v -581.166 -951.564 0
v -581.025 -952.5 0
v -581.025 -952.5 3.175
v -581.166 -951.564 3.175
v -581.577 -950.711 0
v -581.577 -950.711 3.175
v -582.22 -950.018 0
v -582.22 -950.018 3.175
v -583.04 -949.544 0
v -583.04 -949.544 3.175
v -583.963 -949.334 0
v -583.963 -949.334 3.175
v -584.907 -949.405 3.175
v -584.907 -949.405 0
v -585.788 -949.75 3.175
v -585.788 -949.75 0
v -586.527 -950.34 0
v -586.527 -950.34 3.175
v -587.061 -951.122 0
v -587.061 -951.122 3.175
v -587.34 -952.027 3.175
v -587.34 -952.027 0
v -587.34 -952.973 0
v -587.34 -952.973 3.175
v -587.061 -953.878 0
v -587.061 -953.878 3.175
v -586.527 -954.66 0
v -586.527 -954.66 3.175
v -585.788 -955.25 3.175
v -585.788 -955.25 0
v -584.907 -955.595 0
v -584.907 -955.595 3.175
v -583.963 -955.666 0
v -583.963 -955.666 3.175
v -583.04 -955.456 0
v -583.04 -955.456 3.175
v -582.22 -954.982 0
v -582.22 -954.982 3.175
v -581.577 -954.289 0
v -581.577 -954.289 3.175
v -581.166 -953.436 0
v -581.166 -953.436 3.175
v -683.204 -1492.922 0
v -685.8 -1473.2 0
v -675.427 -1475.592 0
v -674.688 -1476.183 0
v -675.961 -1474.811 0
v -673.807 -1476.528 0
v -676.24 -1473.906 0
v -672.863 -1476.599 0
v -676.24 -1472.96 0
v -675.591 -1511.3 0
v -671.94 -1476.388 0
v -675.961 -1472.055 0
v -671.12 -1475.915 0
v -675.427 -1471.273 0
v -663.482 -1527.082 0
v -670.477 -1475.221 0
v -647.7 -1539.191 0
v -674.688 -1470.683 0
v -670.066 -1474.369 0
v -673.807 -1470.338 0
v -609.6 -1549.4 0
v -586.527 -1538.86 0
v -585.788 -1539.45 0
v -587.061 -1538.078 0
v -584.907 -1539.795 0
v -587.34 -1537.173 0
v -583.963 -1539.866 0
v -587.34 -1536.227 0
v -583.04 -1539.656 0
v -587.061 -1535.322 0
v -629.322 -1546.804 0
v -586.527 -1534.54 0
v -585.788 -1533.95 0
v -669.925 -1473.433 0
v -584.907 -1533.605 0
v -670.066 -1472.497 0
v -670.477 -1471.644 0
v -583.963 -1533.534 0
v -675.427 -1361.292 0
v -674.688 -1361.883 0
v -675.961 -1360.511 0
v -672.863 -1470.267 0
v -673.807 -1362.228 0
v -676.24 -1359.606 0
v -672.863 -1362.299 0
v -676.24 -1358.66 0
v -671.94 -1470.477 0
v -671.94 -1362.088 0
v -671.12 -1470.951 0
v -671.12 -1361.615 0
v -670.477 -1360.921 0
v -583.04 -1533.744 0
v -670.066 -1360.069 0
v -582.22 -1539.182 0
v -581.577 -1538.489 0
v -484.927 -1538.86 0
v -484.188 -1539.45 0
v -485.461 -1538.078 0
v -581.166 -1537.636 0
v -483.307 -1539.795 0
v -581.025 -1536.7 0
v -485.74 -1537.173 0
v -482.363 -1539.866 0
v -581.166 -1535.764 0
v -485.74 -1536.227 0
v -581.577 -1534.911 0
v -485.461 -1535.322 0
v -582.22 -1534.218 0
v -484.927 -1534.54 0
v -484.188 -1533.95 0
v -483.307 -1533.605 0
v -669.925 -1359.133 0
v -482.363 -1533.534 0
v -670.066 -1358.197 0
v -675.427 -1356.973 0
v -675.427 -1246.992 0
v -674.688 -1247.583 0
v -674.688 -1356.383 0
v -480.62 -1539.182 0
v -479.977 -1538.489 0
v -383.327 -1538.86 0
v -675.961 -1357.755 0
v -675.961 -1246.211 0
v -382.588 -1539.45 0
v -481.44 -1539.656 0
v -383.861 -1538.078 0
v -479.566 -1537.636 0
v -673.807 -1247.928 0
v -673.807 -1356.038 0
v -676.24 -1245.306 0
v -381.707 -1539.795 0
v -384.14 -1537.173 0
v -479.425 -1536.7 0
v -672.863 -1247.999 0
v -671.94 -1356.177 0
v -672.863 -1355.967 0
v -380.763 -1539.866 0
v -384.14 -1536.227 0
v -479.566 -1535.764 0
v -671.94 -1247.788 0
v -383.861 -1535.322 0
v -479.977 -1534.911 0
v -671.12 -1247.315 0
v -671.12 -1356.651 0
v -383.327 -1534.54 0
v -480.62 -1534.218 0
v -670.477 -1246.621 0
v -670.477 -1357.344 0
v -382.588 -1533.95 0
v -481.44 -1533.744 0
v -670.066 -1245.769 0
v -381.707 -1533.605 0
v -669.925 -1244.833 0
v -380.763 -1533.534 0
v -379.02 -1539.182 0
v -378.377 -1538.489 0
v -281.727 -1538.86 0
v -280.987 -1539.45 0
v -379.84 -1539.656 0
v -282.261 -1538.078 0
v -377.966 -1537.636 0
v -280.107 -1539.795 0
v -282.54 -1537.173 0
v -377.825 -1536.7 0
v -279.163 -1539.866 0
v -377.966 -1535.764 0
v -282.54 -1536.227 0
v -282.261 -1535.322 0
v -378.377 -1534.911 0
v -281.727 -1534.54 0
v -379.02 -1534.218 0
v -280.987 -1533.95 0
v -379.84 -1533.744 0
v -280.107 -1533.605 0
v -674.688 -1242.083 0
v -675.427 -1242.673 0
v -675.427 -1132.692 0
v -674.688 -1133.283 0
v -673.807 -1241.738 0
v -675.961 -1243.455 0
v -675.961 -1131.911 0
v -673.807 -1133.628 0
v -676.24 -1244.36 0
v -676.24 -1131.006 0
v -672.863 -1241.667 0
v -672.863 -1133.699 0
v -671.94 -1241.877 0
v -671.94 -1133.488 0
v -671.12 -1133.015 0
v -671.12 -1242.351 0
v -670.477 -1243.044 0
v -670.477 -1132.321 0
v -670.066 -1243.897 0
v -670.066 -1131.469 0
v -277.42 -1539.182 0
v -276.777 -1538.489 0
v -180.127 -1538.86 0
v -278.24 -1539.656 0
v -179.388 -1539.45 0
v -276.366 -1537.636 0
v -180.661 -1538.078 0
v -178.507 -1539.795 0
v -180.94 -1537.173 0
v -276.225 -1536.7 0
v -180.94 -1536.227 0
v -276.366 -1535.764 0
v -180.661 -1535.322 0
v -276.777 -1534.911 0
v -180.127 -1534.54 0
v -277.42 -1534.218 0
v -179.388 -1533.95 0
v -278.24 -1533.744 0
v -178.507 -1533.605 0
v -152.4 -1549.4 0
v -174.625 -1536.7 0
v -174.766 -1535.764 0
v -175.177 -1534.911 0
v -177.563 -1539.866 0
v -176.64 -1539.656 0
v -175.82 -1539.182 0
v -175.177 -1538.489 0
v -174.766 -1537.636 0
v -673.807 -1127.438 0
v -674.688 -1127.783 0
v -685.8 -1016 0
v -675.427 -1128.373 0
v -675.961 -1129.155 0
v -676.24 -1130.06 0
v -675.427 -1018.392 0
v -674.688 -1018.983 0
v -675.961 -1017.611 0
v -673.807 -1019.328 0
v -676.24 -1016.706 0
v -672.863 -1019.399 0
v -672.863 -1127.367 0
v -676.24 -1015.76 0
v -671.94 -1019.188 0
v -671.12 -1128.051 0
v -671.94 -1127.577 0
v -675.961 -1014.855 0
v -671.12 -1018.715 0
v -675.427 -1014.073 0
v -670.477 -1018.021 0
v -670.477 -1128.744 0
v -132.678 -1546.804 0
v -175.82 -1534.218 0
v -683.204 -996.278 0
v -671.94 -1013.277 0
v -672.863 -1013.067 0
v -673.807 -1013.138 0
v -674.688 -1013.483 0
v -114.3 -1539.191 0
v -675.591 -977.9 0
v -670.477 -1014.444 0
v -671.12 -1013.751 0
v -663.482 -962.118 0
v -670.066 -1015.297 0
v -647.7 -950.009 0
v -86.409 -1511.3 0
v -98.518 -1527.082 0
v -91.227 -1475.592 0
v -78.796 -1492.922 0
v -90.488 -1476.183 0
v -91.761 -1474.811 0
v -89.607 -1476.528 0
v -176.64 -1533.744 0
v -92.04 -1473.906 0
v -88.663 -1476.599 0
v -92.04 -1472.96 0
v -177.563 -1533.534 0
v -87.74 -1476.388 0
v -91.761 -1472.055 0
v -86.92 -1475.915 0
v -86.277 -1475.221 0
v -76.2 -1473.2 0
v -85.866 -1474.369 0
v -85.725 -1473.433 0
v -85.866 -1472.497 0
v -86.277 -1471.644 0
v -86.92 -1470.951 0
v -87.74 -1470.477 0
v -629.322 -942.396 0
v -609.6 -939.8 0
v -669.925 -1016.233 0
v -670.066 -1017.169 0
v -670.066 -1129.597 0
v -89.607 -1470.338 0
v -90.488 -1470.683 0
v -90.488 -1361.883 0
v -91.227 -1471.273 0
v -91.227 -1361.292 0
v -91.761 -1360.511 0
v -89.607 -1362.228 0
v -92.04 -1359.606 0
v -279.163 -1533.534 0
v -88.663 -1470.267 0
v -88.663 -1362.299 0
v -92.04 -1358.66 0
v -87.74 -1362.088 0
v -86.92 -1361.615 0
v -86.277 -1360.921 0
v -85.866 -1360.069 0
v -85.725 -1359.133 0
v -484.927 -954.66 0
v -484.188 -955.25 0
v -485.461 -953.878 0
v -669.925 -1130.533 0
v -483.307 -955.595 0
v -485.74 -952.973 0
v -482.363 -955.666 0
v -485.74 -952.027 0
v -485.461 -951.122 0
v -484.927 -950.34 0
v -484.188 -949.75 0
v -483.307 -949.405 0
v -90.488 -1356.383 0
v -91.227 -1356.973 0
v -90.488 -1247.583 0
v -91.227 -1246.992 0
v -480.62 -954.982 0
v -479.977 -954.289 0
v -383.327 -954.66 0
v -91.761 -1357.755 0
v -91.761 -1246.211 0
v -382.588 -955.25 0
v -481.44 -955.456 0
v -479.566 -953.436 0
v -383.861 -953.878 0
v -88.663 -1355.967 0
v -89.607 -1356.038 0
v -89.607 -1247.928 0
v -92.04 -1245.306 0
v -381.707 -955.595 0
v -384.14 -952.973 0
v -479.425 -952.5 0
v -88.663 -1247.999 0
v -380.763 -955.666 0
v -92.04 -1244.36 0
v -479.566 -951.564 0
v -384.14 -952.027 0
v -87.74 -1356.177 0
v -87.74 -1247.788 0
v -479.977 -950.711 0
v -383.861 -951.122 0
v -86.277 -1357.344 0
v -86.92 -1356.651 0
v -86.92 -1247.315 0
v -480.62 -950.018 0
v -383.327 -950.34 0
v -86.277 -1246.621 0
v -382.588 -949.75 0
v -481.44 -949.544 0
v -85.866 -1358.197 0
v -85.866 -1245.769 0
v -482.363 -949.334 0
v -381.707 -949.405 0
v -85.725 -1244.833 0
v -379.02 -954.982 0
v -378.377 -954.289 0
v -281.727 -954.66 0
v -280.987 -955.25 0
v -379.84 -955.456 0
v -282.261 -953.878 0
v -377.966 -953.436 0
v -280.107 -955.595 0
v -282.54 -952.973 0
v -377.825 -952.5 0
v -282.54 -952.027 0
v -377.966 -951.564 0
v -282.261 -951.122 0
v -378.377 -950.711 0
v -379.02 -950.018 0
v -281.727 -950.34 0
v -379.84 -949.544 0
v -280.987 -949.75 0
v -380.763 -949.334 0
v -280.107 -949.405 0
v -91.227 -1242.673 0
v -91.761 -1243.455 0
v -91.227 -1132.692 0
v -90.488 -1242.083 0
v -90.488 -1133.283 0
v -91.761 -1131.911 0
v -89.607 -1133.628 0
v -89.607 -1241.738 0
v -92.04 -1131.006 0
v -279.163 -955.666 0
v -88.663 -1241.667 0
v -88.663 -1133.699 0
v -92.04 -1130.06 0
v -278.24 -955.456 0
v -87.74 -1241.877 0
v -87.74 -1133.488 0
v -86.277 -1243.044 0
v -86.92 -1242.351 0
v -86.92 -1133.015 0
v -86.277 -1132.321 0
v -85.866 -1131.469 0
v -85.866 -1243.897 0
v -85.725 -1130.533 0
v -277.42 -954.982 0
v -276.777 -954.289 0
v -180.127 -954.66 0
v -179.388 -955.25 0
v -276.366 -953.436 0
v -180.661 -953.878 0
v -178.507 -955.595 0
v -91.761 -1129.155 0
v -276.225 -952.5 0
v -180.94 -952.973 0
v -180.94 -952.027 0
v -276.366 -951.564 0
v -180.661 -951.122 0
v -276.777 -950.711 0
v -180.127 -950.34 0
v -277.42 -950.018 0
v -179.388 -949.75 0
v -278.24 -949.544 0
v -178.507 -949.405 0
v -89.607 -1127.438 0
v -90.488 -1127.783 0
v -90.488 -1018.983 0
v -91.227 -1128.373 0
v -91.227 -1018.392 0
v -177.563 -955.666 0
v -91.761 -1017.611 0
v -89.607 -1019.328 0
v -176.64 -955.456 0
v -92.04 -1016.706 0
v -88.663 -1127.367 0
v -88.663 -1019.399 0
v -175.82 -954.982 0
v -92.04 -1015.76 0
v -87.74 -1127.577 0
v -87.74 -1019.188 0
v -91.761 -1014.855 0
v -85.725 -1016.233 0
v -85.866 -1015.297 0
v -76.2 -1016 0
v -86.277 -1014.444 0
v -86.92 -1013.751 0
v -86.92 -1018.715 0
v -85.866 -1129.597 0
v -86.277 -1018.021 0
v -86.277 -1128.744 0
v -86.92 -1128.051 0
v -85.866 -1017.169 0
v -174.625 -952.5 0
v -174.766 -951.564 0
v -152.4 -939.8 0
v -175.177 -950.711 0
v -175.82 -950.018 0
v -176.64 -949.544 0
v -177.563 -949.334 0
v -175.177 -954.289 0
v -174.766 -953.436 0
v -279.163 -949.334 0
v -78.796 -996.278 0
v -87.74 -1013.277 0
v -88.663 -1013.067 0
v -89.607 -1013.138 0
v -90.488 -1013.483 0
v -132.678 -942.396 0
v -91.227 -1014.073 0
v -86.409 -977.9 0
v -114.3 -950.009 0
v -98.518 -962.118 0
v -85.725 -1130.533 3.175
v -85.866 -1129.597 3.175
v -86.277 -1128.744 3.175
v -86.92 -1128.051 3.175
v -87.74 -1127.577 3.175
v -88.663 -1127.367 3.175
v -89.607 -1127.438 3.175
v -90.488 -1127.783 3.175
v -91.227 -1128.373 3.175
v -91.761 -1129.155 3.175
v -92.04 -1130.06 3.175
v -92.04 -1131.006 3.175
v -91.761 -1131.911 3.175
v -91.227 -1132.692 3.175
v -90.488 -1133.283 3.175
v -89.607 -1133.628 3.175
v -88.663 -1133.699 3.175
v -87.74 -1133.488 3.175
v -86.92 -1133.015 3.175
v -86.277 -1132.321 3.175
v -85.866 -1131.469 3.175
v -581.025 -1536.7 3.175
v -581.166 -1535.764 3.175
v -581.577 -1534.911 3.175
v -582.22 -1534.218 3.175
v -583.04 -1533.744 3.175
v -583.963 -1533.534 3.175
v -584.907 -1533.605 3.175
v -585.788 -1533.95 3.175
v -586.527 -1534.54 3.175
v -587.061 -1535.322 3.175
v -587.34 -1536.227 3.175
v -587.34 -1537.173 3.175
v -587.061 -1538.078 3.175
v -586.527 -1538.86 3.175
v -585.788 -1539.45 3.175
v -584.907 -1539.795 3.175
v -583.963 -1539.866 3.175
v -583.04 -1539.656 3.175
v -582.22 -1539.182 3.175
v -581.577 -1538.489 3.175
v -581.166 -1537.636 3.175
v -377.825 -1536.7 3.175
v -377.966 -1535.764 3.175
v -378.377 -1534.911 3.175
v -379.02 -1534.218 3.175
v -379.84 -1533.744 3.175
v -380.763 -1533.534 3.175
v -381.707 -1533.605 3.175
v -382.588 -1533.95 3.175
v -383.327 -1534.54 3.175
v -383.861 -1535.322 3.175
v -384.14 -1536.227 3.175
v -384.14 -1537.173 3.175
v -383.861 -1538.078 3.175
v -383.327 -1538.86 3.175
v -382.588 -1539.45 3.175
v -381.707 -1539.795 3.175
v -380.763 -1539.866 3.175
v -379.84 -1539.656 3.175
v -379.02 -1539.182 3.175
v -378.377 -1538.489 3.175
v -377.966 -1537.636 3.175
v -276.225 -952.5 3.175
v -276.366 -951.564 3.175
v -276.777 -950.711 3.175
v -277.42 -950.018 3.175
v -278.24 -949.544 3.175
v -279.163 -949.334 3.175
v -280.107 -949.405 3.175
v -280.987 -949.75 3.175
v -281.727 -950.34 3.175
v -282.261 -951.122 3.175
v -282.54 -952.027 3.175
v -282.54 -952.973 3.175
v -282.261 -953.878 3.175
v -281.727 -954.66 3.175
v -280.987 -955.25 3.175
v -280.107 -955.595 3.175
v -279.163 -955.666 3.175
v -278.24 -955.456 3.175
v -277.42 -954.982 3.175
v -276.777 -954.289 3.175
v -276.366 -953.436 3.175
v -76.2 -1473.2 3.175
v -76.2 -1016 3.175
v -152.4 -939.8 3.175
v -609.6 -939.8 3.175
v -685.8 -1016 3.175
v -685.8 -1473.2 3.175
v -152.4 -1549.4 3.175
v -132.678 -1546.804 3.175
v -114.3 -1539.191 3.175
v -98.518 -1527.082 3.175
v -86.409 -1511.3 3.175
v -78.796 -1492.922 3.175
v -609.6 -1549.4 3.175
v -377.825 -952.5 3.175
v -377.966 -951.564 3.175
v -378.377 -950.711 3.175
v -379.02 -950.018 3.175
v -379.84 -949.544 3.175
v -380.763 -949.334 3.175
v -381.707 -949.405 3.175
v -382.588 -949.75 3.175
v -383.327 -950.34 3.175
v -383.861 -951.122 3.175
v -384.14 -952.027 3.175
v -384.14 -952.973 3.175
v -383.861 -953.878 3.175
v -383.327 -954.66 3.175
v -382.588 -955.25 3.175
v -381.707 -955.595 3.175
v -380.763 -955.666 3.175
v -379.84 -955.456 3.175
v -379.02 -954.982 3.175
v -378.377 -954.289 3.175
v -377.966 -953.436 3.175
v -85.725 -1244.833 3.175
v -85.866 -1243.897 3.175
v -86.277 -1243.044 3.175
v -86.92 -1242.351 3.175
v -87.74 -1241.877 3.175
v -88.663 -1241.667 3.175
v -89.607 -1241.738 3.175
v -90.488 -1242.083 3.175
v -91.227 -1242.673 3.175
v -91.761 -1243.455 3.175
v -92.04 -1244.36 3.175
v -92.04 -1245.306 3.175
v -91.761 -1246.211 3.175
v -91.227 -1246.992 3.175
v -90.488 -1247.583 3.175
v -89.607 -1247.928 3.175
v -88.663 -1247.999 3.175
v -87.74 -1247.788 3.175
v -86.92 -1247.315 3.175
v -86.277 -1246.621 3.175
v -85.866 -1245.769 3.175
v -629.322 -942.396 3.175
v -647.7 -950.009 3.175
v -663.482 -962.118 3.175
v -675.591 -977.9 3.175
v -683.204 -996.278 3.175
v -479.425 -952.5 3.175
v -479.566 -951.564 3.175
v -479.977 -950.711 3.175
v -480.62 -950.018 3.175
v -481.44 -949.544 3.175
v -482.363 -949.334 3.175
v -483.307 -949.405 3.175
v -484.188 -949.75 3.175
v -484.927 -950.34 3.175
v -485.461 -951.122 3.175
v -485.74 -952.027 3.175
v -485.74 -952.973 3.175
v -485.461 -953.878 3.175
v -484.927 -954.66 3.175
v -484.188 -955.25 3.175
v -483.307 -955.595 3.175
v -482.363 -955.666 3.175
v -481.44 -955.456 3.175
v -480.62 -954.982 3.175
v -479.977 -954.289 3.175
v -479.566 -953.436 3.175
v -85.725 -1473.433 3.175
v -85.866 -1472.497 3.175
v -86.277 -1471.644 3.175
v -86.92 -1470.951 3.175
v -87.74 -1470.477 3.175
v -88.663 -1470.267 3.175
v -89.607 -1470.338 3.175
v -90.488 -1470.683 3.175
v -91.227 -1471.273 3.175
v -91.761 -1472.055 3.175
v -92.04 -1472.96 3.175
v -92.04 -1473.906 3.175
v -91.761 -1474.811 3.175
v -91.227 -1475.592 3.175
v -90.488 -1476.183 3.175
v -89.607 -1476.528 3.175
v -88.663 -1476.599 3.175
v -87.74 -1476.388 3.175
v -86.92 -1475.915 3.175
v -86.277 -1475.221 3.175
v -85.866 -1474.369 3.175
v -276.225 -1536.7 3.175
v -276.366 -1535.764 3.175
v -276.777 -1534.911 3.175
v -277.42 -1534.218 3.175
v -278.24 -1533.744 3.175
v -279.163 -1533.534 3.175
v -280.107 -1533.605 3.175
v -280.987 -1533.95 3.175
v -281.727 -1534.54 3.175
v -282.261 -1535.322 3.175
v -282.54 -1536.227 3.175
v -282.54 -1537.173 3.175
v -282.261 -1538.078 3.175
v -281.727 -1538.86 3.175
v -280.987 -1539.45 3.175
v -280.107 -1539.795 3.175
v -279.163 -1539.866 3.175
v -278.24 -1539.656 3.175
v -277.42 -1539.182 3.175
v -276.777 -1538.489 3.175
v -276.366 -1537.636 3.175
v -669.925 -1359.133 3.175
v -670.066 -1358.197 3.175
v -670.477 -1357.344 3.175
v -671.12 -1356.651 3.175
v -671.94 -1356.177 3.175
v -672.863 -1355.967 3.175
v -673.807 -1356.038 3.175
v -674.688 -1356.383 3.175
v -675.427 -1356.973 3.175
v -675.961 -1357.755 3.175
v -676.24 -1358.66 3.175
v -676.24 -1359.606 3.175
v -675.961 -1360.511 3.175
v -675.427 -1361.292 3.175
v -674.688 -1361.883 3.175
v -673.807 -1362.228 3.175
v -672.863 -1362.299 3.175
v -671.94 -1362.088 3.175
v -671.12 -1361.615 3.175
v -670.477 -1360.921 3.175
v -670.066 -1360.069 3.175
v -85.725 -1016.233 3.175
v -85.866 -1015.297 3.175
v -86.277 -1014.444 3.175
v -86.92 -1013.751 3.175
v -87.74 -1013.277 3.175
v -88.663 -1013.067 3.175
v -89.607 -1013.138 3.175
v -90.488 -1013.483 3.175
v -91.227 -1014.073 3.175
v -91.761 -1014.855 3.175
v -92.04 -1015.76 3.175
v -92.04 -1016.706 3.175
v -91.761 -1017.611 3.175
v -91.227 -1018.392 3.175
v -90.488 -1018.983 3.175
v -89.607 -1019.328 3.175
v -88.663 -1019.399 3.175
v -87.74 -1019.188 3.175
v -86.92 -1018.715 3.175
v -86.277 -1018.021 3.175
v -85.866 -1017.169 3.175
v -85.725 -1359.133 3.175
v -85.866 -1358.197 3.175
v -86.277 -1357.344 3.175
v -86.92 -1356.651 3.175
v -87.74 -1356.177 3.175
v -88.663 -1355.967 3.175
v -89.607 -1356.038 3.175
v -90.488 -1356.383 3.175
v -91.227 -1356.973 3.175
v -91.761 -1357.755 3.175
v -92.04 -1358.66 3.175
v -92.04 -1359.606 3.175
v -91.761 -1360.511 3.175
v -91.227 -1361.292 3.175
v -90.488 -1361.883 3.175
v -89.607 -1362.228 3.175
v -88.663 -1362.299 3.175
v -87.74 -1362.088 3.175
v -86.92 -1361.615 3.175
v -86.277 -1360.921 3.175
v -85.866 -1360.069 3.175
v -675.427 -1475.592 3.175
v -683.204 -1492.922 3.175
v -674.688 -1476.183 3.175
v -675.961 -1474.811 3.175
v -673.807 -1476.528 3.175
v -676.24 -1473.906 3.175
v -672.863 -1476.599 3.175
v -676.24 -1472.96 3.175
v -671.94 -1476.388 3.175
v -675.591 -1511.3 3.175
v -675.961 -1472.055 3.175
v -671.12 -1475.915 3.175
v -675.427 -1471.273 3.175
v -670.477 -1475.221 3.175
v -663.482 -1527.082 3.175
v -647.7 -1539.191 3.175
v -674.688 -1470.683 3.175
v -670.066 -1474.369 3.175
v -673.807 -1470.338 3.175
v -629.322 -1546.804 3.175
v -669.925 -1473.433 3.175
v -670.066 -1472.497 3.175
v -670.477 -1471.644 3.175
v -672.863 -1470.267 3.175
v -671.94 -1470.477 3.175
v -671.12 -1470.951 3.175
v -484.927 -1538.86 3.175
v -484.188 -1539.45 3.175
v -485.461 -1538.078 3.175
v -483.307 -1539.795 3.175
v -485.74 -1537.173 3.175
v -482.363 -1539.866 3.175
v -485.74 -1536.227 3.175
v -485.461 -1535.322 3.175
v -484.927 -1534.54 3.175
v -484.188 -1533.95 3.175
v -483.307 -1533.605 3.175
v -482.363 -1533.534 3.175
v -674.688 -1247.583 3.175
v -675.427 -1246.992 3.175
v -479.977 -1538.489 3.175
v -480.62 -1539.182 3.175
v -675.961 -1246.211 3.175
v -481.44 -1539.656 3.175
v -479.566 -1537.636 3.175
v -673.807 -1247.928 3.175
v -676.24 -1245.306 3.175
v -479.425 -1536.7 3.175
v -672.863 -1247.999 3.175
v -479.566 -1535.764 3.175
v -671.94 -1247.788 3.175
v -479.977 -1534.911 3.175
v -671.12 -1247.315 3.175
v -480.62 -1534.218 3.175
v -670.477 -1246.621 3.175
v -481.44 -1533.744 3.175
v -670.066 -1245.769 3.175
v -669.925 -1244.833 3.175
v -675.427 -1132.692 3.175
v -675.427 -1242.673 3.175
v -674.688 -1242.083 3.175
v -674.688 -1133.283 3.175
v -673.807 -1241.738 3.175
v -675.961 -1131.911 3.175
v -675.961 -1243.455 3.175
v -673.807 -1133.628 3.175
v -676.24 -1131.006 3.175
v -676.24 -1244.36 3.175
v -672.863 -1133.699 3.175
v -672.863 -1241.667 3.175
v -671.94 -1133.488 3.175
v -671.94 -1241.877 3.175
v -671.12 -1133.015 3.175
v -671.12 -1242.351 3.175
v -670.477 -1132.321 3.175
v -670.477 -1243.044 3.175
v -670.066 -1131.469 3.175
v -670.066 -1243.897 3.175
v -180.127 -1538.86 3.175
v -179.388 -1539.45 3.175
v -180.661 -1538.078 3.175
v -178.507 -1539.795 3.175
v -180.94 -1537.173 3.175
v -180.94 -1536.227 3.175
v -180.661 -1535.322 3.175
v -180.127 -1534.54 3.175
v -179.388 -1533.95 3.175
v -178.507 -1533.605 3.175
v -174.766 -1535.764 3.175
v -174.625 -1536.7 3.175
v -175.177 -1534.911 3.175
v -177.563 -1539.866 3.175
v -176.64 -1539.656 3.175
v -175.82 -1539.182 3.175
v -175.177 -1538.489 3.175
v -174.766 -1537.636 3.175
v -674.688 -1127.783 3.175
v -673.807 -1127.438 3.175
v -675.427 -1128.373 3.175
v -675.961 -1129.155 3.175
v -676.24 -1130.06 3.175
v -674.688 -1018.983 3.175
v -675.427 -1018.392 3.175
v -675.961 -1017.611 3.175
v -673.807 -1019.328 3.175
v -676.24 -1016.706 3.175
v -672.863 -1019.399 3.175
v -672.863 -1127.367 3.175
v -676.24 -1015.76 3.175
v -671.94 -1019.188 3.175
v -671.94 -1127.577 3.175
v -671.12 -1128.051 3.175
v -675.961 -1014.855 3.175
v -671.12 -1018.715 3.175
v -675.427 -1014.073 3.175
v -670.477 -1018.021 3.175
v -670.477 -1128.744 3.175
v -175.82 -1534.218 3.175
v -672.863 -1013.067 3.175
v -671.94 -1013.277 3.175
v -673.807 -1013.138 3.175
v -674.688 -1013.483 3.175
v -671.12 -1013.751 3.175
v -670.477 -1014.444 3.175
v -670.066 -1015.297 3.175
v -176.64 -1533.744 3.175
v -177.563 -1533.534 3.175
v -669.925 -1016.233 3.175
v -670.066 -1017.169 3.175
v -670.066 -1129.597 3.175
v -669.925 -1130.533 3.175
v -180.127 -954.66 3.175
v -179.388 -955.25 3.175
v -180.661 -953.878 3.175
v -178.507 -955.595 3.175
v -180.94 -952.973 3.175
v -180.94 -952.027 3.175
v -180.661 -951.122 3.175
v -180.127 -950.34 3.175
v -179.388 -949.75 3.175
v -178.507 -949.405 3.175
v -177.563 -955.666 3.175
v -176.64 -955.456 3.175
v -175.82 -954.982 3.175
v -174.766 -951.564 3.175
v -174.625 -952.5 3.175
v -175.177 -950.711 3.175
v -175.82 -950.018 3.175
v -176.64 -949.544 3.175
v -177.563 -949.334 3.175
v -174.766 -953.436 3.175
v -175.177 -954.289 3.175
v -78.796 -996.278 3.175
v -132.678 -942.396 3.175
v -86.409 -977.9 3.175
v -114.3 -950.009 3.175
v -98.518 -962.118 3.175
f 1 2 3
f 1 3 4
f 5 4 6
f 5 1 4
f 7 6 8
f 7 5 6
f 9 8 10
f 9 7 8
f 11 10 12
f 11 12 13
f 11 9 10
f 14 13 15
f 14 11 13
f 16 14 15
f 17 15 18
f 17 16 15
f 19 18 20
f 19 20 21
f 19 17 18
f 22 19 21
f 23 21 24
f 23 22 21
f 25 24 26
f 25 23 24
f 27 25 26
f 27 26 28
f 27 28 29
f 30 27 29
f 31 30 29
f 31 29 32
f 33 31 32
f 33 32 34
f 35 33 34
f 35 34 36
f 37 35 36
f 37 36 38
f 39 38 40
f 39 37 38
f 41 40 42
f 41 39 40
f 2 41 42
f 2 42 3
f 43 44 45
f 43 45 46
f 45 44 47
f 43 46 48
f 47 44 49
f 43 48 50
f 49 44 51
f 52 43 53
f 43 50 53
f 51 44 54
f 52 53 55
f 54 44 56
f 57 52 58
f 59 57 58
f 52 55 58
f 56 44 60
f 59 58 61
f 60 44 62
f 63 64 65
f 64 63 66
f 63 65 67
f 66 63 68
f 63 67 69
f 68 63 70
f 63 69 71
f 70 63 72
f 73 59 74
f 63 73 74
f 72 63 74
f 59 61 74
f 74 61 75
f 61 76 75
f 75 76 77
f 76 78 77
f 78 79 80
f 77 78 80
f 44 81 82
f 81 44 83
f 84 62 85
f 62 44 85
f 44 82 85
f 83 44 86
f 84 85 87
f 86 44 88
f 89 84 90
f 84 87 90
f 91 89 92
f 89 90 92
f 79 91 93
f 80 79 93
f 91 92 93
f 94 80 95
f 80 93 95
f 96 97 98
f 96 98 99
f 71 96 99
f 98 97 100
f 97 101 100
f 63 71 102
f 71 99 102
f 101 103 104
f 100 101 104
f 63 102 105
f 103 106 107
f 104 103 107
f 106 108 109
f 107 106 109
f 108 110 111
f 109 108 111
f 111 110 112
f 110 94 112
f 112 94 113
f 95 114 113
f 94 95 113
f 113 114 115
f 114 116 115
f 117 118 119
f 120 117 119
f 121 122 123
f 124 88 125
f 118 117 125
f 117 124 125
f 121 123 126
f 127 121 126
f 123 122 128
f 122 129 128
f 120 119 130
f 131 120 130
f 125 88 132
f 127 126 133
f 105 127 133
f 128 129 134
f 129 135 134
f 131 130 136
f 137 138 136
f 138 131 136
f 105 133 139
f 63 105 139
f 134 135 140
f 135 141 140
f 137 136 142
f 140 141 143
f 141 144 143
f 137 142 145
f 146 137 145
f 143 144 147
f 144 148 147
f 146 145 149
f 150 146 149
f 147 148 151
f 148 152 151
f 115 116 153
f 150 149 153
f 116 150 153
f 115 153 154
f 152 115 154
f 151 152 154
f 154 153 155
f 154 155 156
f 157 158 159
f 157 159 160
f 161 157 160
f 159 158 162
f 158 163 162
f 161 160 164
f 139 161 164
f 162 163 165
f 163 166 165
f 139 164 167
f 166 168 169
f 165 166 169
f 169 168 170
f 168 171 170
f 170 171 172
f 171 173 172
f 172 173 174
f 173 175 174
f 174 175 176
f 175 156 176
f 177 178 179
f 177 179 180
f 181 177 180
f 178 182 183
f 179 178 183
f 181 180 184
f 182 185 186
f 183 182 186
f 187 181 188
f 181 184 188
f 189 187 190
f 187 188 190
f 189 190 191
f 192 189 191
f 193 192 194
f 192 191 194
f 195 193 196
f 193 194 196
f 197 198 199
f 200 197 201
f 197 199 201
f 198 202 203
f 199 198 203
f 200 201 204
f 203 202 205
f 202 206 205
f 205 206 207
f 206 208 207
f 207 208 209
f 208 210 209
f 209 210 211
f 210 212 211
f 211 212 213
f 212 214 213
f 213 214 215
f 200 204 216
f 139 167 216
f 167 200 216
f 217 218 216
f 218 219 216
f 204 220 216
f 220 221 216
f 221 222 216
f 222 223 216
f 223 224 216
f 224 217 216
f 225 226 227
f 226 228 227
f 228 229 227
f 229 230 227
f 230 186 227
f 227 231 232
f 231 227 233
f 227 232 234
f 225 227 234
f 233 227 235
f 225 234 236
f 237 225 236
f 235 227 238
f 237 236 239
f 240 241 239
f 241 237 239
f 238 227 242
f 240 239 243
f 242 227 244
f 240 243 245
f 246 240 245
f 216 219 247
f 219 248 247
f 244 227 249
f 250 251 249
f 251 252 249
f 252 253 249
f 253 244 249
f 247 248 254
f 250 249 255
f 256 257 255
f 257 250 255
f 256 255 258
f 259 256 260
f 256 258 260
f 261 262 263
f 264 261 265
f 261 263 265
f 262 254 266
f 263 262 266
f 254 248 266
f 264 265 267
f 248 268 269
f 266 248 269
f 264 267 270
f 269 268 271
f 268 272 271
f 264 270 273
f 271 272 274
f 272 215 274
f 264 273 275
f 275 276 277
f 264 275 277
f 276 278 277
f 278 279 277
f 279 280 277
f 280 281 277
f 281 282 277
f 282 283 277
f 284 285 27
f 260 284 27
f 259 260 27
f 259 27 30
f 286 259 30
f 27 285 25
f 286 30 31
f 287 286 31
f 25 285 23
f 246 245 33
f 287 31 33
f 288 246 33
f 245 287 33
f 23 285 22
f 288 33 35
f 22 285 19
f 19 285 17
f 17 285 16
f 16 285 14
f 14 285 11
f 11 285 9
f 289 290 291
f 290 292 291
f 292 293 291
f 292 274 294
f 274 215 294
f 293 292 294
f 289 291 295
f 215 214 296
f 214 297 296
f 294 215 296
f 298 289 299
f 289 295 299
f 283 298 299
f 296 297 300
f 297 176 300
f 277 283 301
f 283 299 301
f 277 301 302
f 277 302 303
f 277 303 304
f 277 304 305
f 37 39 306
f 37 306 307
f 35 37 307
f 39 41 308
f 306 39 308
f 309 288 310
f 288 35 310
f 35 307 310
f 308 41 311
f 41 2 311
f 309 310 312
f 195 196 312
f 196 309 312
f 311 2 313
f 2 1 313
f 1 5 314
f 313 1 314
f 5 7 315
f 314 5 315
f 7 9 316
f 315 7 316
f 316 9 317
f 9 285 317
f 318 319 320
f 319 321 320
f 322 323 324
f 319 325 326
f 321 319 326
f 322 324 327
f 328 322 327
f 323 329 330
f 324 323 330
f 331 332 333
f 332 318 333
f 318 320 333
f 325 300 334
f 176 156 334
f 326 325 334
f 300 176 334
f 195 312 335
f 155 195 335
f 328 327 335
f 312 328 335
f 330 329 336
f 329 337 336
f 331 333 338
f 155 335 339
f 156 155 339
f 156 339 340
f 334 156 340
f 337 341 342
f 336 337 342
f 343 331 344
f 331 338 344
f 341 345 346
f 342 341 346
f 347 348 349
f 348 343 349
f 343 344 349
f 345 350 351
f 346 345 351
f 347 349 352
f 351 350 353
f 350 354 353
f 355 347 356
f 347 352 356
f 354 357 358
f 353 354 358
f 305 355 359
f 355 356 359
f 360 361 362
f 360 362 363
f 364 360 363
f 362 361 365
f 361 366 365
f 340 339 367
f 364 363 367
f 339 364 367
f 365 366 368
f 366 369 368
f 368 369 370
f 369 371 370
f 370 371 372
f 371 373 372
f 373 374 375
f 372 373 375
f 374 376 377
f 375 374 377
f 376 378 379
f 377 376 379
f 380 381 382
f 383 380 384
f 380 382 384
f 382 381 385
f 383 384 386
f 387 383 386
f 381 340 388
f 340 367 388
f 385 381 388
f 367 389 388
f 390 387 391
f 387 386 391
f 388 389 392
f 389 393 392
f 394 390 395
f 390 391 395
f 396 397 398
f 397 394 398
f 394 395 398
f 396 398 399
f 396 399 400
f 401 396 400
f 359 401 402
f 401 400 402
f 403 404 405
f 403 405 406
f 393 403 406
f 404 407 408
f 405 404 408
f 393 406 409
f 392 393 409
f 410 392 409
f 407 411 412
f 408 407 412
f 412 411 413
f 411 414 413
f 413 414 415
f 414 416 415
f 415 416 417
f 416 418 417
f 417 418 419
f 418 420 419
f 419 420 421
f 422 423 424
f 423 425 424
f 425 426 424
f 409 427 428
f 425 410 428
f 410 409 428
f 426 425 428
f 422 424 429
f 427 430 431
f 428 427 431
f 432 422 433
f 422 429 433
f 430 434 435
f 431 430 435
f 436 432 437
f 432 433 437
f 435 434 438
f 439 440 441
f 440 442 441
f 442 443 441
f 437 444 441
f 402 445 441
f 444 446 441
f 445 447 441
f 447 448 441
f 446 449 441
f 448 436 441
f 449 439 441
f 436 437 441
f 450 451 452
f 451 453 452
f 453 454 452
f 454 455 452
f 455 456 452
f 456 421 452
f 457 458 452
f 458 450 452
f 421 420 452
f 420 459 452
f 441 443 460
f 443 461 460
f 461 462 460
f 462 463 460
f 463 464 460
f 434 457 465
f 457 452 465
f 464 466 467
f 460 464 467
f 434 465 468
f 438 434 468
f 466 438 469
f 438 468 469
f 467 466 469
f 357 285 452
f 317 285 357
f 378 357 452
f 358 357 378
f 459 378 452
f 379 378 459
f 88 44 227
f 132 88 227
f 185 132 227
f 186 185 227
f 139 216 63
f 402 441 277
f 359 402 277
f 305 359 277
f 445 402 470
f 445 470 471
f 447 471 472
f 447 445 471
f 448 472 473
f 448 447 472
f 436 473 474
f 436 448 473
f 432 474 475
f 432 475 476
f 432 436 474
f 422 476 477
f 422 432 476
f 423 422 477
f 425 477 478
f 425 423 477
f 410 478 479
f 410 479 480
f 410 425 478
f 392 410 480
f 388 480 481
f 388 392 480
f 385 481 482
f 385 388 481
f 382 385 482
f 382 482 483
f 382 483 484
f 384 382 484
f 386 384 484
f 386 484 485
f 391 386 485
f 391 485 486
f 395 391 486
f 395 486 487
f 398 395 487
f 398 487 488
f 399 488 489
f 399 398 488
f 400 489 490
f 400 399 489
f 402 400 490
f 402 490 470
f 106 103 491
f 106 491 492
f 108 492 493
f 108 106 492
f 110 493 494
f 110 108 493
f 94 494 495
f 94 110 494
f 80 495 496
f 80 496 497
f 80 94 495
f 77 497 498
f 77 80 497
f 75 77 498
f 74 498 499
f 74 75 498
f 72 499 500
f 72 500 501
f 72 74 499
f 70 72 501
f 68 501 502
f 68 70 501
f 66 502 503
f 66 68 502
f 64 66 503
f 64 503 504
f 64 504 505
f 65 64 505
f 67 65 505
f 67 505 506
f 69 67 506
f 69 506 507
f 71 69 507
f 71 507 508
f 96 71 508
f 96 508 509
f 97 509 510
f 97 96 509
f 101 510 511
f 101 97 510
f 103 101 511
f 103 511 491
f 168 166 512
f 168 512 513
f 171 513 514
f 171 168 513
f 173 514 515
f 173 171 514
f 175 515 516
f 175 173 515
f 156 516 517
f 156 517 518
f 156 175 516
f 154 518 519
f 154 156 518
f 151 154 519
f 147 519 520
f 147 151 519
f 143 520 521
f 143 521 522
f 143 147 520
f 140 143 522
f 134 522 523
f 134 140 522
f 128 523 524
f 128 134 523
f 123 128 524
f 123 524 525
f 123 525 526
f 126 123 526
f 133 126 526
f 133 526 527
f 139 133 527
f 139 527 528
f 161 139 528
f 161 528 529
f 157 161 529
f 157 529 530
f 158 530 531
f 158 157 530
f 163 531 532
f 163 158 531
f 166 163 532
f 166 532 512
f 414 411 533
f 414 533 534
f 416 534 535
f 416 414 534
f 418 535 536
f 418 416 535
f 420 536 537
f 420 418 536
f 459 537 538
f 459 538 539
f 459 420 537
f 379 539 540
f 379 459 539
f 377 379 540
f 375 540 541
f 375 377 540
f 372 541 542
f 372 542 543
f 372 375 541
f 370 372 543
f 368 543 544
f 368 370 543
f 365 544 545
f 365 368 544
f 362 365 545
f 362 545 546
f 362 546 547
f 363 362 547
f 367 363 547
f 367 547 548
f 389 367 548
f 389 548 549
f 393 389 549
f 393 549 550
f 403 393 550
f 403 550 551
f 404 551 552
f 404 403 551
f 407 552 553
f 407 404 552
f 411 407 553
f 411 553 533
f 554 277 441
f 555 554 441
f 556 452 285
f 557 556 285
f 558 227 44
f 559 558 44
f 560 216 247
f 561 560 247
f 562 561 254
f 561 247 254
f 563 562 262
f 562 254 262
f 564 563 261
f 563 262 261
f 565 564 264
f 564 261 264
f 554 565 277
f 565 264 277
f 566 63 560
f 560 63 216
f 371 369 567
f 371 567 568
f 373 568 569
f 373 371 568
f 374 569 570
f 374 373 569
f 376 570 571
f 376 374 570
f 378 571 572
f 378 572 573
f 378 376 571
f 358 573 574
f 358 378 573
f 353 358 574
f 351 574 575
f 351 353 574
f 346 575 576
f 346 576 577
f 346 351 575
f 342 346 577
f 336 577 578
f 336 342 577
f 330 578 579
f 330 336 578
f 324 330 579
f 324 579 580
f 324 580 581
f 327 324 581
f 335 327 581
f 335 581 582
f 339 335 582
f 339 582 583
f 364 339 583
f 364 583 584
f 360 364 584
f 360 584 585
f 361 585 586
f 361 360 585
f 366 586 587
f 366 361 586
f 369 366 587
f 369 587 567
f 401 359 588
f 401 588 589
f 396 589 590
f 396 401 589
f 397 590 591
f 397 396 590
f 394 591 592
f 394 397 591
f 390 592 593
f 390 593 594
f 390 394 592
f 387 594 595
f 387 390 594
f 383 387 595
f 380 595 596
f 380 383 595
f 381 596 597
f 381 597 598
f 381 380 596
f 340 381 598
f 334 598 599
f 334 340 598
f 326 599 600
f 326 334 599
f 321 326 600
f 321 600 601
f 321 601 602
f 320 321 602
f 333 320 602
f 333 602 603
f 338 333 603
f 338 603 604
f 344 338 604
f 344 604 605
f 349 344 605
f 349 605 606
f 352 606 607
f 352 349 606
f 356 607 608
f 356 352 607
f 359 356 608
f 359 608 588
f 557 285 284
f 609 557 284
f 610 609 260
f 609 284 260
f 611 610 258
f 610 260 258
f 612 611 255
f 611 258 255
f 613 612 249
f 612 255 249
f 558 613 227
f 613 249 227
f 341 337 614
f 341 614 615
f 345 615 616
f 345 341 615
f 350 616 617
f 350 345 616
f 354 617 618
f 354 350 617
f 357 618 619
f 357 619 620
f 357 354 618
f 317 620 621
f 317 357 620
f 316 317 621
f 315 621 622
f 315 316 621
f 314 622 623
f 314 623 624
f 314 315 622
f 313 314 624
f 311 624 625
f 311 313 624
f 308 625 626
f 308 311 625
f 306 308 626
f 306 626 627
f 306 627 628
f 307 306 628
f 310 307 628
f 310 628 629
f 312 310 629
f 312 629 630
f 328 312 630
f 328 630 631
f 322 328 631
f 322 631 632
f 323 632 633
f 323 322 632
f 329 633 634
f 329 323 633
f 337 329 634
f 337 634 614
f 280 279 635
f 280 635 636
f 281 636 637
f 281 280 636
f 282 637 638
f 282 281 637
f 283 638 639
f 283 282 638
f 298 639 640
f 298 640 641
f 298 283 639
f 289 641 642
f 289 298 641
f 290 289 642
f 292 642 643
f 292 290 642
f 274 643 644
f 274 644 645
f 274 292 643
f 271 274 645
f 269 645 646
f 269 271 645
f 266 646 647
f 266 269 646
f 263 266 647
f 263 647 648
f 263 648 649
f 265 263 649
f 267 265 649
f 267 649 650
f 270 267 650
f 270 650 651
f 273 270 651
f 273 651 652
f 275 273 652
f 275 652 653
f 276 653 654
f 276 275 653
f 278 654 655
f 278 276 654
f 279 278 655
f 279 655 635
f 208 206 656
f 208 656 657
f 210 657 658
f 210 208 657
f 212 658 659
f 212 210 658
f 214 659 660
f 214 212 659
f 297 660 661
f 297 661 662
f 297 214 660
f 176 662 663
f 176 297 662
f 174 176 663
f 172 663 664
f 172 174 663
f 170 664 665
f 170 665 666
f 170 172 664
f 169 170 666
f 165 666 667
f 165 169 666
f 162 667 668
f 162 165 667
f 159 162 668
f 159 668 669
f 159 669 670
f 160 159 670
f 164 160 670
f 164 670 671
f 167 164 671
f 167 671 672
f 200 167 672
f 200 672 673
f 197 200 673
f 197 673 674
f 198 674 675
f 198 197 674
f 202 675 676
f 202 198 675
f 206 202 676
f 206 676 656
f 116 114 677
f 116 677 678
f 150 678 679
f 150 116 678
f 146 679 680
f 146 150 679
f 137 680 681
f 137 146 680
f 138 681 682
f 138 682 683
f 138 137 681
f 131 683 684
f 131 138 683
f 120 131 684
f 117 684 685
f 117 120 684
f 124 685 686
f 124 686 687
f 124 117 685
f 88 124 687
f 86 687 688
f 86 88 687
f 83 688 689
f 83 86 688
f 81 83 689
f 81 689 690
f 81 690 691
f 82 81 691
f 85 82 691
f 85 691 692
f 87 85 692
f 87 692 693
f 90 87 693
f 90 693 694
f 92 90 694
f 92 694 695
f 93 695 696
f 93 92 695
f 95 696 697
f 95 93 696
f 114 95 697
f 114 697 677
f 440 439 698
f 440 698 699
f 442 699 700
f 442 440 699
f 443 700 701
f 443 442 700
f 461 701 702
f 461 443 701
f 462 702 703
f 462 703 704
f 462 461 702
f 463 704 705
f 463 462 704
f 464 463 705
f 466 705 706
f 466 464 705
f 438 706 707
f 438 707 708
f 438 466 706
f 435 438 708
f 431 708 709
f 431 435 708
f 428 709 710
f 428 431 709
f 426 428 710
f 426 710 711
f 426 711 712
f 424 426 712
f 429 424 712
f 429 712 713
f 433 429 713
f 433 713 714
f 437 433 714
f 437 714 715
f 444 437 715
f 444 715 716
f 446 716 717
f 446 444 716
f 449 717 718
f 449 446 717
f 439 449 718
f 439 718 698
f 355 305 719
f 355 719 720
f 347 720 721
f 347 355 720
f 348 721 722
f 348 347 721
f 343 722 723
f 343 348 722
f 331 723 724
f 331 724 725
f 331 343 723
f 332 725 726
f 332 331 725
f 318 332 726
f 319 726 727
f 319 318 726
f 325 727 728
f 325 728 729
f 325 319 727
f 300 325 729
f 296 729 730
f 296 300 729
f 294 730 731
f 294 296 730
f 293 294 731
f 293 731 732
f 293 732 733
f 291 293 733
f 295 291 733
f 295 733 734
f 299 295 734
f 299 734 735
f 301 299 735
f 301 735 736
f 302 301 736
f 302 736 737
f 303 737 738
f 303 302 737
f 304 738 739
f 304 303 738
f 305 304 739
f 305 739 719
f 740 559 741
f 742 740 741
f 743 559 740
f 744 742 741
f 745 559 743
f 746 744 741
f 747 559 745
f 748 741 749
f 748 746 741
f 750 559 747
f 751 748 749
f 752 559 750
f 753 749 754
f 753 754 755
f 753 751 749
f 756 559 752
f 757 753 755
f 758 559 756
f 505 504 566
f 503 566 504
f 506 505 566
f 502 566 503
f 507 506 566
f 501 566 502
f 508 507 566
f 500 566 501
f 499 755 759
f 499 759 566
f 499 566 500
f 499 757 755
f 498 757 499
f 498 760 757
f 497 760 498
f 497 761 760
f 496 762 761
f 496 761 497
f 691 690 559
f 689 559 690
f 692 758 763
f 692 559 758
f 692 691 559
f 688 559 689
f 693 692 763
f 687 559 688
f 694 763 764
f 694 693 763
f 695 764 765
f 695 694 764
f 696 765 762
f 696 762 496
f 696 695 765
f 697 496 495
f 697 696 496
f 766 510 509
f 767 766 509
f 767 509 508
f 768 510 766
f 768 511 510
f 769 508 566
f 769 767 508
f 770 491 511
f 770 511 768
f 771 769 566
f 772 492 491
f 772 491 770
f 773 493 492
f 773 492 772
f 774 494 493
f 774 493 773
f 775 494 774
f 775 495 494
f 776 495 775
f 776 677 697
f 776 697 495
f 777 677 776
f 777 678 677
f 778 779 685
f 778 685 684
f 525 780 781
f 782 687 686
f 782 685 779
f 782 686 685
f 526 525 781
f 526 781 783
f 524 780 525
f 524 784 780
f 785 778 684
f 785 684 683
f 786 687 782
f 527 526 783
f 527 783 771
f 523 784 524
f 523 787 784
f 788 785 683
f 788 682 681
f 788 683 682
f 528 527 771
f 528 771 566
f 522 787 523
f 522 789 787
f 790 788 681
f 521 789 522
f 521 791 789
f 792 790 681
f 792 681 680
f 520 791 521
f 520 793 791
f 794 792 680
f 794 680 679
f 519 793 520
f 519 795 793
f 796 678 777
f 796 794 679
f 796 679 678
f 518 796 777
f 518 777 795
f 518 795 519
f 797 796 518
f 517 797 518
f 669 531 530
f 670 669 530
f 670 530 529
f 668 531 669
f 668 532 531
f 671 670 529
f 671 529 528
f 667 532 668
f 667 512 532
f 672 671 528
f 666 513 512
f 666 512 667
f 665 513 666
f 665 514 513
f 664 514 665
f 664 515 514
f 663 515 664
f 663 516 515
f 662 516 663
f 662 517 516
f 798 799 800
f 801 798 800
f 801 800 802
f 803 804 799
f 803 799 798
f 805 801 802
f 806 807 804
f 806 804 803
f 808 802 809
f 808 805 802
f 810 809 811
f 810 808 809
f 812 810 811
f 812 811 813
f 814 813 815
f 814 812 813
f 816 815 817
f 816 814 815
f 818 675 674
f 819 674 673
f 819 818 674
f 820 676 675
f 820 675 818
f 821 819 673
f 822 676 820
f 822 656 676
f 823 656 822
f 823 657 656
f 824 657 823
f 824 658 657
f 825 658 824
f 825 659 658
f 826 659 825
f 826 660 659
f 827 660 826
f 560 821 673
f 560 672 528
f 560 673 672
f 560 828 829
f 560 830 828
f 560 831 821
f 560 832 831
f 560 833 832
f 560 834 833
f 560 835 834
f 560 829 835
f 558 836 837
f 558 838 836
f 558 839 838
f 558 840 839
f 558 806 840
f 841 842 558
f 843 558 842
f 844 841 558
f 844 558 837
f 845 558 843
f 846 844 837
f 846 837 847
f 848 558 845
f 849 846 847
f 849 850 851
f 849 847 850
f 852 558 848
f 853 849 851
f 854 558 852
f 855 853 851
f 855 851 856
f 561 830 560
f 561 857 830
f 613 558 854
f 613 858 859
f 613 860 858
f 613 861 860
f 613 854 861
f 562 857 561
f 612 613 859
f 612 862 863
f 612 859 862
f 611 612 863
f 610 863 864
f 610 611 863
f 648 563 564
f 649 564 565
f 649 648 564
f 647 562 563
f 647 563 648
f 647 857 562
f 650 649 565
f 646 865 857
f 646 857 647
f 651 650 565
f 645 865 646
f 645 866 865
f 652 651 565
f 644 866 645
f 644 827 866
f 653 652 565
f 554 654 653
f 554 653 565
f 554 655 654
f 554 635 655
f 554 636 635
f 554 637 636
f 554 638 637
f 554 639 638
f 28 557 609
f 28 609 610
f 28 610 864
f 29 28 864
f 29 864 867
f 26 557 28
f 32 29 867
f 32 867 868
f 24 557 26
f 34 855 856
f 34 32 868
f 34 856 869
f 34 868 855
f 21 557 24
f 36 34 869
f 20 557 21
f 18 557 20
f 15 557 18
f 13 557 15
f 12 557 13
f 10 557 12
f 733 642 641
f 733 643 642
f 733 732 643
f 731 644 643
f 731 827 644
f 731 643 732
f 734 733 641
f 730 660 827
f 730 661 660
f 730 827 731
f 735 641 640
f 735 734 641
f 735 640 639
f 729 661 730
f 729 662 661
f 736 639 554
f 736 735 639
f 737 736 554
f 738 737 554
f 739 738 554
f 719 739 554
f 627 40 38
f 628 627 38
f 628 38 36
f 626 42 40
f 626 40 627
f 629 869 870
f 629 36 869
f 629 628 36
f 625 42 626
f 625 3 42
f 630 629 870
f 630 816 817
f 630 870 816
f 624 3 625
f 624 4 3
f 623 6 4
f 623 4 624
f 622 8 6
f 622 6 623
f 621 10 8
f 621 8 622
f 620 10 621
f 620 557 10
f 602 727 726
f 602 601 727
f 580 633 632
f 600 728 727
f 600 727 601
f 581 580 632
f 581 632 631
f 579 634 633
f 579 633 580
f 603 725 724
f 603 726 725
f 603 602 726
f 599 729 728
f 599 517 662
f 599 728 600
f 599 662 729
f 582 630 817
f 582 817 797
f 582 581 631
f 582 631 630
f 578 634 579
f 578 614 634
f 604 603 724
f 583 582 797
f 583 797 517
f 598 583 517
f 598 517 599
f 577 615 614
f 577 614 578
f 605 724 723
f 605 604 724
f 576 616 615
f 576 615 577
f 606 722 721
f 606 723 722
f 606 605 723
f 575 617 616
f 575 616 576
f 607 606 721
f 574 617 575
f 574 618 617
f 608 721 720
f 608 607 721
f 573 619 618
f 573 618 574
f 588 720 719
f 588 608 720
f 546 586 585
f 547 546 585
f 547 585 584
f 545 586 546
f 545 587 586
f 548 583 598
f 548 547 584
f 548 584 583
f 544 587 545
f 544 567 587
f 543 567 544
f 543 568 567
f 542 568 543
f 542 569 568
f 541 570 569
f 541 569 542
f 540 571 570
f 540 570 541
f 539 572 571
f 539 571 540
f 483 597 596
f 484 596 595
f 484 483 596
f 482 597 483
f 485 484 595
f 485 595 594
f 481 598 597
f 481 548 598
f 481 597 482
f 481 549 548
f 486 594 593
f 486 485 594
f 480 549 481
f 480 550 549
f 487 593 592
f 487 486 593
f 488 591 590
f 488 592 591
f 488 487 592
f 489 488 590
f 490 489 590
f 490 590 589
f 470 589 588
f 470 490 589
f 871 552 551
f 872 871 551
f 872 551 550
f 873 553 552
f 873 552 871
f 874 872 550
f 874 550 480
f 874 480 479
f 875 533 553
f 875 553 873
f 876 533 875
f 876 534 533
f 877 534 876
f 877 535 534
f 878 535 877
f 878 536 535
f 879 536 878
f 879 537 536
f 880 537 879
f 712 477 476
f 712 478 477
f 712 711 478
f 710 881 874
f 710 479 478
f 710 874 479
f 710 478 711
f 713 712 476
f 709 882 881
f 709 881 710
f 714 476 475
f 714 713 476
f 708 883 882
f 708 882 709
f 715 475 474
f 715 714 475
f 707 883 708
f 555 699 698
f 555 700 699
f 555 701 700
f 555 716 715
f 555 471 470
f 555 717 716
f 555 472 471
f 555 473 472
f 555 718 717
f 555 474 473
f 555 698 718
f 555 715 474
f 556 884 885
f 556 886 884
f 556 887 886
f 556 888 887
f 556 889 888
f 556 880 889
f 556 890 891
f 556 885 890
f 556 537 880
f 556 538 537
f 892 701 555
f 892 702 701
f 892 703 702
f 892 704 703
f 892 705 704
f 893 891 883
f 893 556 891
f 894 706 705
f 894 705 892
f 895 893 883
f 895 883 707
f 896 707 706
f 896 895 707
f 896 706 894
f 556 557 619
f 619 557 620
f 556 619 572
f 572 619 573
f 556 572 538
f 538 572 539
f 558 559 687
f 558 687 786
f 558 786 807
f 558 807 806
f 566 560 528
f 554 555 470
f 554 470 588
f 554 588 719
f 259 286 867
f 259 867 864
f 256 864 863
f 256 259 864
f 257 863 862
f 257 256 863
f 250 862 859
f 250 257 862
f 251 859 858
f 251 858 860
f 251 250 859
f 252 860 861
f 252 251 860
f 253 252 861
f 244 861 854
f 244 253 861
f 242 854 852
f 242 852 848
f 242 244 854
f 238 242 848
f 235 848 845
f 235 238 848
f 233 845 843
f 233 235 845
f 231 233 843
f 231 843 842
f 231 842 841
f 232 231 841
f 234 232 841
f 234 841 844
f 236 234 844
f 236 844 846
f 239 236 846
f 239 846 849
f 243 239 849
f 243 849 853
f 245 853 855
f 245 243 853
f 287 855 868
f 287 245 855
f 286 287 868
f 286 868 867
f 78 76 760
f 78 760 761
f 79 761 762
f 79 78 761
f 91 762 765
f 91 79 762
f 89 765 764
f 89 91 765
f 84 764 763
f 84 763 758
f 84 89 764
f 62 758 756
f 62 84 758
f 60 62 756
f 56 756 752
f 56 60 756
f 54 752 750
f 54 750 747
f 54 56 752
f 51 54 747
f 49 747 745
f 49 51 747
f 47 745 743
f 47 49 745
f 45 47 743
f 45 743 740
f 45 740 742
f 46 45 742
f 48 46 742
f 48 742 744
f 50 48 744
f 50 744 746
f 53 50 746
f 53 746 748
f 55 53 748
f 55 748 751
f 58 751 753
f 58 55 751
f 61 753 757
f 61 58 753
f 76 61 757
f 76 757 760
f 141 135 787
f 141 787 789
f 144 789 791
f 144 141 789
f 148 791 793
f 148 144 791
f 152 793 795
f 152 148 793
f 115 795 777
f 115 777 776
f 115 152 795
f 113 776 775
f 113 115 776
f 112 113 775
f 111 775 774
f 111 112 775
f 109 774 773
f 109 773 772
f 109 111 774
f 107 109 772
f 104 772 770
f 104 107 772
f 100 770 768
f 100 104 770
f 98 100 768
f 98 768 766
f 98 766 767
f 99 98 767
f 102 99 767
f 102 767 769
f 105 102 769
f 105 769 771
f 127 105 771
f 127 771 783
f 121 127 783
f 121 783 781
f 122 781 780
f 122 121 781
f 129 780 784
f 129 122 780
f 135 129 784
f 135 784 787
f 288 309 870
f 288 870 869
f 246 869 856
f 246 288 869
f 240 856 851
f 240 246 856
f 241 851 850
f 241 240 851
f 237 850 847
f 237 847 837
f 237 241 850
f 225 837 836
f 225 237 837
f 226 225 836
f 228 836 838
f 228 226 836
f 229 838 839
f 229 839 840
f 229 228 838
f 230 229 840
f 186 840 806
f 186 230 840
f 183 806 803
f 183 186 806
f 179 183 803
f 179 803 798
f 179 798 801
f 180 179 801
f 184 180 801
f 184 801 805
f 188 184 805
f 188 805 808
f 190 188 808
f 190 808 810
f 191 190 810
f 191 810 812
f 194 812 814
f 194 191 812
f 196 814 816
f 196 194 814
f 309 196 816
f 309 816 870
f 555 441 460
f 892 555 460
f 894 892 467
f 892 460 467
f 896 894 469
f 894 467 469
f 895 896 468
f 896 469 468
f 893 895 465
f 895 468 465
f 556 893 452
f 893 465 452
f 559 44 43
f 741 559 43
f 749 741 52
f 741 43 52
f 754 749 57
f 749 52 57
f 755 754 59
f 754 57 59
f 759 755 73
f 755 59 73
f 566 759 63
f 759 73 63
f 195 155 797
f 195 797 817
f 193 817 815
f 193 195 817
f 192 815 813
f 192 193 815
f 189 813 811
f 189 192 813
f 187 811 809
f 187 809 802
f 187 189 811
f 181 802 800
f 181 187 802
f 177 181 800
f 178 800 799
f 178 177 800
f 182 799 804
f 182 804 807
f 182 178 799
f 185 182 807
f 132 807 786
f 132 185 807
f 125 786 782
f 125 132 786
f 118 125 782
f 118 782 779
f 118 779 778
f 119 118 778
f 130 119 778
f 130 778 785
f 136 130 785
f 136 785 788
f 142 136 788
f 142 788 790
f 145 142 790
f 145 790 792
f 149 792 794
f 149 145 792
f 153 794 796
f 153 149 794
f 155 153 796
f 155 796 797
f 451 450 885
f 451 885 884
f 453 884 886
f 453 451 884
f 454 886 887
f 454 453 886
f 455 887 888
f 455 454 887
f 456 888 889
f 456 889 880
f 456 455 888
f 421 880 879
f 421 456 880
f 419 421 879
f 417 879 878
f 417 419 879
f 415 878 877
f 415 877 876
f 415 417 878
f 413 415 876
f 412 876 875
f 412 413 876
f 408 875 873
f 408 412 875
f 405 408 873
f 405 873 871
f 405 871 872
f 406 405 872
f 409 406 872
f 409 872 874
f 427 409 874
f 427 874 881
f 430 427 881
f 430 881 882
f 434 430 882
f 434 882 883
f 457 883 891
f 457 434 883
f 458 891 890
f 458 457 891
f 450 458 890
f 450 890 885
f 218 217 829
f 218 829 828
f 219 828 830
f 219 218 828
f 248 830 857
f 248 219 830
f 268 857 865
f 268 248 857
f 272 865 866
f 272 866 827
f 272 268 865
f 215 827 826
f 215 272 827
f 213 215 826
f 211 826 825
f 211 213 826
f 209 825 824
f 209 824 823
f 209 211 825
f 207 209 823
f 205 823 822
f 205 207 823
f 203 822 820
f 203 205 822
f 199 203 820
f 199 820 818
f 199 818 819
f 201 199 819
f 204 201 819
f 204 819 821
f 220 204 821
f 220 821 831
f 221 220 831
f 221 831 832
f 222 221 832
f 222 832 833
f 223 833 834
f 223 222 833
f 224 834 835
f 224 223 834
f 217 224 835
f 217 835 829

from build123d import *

# Parameters (mm, degrees)
MODEL_R             = 3.175
BOSS_EXTRUDE1_DEPTH = 3.175


with BuildPart() as part:
    # Model → Boss-Extrude1 (new body)
    with BuildSketch(Plane.XY):
        with BuildLine():
            Line((-152.4, -939.8), (-609.6, -939.8))
            ThreePointArc((-609.6, -939.8), (-663.481536726, -962.118463274), (-685.8, -1016))
            Line((-685.8, -1016), (-685.8, -1473.2))
            ThreePointArc((-685.8, -1473.2), (-663.481536726, -1527.081536726), (-609.6, -1549.4))
            Line((-609.6, -1549.4), (-152.4, -1549.4))
            ThreePointArc((-152.4, -1549.4), (-98.518463274, -1527.081536726), (-76.2, -1473.2))
            Line((-76.2, -1473.2), (-76.2, -1016))
            ThreePointArc((-76.2, -1016), (-98.518463274, -962.118463274), (-152.4, -939.8))
        make_face()
        with Locations((-381, -952.5)):
            Circle(MODEL_R, mode=Mode.SUBTRACT)
        with Locations((-88.9, -1473.432930672)):
            Circle(MODEL_R, mode=Mode.SUBTRACT)
        with Locations((-88.9, -1359.132930672)):
            Circle(MODEL_R, mode=Mode.SUBTRACT)
        with Locations((-88.9, -1244.832930672)):
            Circle(MODEL_R, mode=Mode.SUBTRACT)
        with Locations((-88.9, -1130.532930672)):
            Circle(MODEL_R, mode=Mode.SUBTRACT)
        with Locations((-482.6, -1536.7)):
            Circle(MODEL_R, mode=Mode.SUBTRACT)
        with Locations((-584.2, -1536.7)):
            Circle(MODEL_R, mode=Mode.SUBTRACT)
        with Locations((-673.1, -1244.832930672)):
            Circle(MODEL_R, mode=Mode.SUBTRACT)
        with Locations((-279.4, -952.5)):
            Circle(MODEL_R, mode=Mode.SUBTRACT)
        with Locations((-482.6, -952.5)):
            Circle(MODEL_R, mode=Mode.SUBTRACT)
        with Locations((-584.2, -952.5)):
            Circle(MODEL_R, mode=Mode.SUBTRACT)
        with Locations((-177.8, -952.5)):
            Circle(MODEL_R, mode=Mode.SUBTRACT)
        with Locations((-88.9, -1016.232930672)):
            Circle(MODEL_R, mode=Mode.SUBTRACT)
        with Locations((-673.1, -1016.232930672)):
            Circle(MODEL_R, mode=Mode.SUBTRACT)
        with Locations((-673.1, -1130.532930672)):
            Circle(MODEL_R, mode=Mode.SUBTRACT)
        with Locations((-673.1, -1473.432930672)):
            Circle(MODEL_R, mode=Mode.SUBTRACT)
        with Locations((-381, -1536.7)):
            Circle(MODEL_R, mode=Mode.SUBTRACT)
        with Locations((-279.4, -1536.7)):
            Circle(MODEL_R, mode=Mode.SUBTRACT)
        with Locations((-177.8, -1536.7)):
            Circle(MODEL_R, mode=Mode.SUBTRACT)
        with Locations((-673.1, -1359.132930672)):
            Circle(MODEL_R, mode=Mode.SUBTRACT)
    extrude(amount=BOSS_EXTRUDE1_DEPTH)


solid = part.part
